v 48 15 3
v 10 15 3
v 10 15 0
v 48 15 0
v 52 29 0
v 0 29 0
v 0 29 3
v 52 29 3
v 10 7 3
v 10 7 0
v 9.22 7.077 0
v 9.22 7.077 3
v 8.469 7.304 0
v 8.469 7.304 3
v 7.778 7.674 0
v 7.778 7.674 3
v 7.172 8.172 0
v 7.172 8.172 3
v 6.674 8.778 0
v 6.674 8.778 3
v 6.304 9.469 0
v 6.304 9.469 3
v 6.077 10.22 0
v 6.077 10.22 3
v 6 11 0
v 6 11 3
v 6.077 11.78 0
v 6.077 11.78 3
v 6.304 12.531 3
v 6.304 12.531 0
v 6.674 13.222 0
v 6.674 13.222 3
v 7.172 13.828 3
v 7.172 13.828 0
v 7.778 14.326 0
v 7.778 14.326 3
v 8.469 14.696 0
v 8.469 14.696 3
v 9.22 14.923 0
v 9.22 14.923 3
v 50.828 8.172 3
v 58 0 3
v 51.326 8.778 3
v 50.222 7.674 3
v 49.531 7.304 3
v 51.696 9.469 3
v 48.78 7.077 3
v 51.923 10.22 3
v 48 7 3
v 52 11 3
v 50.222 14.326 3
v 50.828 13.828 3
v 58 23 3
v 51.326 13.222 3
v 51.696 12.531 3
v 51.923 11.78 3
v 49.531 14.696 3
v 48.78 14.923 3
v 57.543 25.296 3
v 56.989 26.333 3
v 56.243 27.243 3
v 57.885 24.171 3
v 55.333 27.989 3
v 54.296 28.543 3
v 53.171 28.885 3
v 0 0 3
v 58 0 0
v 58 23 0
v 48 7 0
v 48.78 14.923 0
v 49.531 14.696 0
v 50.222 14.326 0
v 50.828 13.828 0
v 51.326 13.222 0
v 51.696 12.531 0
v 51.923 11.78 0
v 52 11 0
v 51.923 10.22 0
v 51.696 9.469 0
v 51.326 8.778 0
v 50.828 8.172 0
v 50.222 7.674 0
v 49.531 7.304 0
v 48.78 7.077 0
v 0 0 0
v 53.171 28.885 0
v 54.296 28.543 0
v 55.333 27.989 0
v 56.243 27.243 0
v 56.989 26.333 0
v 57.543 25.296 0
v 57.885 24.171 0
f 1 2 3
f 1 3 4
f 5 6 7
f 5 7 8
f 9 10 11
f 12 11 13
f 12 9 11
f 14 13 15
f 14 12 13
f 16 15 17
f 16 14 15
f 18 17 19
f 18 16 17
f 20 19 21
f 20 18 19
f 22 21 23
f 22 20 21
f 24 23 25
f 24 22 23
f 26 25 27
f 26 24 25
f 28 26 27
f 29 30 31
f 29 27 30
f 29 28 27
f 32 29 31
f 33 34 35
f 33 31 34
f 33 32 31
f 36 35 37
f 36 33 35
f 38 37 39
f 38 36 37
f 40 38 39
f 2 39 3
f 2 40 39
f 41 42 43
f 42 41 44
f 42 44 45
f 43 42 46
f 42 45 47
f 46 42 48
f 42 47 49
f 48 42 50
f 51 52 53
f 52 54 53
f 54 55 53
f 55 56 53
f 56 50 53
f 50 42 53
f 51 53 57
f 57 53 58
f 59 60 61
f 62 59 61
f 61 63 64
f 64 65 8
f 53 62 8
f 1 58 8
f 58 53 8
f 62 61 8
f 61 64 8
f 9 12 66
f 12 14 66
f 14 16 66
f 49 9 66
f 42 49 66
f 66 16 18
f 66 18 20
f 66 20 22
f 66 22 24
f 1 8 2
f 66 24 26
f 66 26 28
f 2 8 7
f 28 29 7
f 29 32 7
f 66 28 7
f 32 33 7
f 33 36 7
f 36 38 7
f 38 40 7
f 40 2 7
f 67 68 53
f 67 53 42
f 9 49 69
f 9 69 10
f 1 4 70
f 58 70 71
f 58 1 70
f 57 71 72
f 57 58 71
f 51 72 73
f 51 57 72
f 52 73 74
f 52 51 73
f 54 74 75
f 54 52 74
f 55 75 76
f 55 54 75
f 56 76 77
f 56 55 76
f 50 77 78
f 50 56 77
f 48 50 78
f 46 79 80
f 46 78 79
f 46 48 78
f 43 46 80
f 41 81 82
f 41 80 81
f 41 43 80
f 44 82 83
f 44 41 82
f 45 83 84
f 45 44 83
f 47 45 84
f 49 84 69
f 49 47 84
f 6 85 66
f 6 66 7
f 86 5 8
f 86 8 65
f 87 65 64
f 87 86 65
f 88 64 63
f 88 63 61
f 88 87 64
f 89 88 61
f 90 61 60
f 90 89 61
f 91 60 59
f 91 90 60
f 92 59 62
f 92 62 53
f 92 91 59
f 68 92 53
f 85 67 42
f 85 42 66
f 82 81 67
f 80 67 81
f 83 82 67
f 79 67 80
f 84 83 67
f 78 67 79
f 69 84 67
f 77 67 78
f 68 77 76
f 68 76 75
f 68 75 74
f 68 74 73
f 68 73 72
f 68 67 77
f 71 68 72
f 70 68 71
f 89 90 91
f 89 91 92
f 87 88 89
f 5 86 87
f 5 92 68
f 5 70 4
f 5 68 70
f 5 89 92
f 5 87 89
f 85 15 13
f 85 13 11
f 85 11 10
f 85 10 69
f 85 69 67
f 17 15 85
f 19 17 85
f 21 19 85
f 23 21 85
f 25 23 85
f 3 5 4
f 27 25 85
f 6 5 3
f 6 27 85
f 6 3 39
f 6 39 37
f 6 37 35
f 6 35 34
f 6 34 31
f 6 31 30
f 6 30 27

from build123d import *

# Parameters (mm, degrees)
BOSS_EXTRUDE1_DEPTH = 3
CUT_EXTRUDE2_DEPTH  = 10


with BuildPart() as part:
    # Sketch1 → Boss-Extrude1 (new body)
    with BuildSketch(Plane.XY):
        with BuildLine():
            Line((0, 29), (52, 29))
            ThreePointArc((52, 29), (56.242640687, 27.242640687), (58, 23))
            Line((58, 23), (58, 0))
            Line((58, 0), (0, 0))
            Line((0, 0), (0, 29))
        make_face()
    extrude(amount=BOSS_EXTRUDE1_DEPTH)

    # Sketch4 → Cut-Extrude2 (cut)
    with BuildSketch(Plane.XY.offset(3)):
        with BuildLine():
            Line((10, 15), (48, 15))
            ThreePointArc((48, 15), (52, 11), (48, 7))
            Line((48, 7), (10, 7))
            ThreePointArc((10, 7), (6, 11), (10, 15))
        make_face()
    extrude(amount=-CUT_EXTRUDE2_DEPTH, mode=Mode.SUBTRACT)


solid = part.part
